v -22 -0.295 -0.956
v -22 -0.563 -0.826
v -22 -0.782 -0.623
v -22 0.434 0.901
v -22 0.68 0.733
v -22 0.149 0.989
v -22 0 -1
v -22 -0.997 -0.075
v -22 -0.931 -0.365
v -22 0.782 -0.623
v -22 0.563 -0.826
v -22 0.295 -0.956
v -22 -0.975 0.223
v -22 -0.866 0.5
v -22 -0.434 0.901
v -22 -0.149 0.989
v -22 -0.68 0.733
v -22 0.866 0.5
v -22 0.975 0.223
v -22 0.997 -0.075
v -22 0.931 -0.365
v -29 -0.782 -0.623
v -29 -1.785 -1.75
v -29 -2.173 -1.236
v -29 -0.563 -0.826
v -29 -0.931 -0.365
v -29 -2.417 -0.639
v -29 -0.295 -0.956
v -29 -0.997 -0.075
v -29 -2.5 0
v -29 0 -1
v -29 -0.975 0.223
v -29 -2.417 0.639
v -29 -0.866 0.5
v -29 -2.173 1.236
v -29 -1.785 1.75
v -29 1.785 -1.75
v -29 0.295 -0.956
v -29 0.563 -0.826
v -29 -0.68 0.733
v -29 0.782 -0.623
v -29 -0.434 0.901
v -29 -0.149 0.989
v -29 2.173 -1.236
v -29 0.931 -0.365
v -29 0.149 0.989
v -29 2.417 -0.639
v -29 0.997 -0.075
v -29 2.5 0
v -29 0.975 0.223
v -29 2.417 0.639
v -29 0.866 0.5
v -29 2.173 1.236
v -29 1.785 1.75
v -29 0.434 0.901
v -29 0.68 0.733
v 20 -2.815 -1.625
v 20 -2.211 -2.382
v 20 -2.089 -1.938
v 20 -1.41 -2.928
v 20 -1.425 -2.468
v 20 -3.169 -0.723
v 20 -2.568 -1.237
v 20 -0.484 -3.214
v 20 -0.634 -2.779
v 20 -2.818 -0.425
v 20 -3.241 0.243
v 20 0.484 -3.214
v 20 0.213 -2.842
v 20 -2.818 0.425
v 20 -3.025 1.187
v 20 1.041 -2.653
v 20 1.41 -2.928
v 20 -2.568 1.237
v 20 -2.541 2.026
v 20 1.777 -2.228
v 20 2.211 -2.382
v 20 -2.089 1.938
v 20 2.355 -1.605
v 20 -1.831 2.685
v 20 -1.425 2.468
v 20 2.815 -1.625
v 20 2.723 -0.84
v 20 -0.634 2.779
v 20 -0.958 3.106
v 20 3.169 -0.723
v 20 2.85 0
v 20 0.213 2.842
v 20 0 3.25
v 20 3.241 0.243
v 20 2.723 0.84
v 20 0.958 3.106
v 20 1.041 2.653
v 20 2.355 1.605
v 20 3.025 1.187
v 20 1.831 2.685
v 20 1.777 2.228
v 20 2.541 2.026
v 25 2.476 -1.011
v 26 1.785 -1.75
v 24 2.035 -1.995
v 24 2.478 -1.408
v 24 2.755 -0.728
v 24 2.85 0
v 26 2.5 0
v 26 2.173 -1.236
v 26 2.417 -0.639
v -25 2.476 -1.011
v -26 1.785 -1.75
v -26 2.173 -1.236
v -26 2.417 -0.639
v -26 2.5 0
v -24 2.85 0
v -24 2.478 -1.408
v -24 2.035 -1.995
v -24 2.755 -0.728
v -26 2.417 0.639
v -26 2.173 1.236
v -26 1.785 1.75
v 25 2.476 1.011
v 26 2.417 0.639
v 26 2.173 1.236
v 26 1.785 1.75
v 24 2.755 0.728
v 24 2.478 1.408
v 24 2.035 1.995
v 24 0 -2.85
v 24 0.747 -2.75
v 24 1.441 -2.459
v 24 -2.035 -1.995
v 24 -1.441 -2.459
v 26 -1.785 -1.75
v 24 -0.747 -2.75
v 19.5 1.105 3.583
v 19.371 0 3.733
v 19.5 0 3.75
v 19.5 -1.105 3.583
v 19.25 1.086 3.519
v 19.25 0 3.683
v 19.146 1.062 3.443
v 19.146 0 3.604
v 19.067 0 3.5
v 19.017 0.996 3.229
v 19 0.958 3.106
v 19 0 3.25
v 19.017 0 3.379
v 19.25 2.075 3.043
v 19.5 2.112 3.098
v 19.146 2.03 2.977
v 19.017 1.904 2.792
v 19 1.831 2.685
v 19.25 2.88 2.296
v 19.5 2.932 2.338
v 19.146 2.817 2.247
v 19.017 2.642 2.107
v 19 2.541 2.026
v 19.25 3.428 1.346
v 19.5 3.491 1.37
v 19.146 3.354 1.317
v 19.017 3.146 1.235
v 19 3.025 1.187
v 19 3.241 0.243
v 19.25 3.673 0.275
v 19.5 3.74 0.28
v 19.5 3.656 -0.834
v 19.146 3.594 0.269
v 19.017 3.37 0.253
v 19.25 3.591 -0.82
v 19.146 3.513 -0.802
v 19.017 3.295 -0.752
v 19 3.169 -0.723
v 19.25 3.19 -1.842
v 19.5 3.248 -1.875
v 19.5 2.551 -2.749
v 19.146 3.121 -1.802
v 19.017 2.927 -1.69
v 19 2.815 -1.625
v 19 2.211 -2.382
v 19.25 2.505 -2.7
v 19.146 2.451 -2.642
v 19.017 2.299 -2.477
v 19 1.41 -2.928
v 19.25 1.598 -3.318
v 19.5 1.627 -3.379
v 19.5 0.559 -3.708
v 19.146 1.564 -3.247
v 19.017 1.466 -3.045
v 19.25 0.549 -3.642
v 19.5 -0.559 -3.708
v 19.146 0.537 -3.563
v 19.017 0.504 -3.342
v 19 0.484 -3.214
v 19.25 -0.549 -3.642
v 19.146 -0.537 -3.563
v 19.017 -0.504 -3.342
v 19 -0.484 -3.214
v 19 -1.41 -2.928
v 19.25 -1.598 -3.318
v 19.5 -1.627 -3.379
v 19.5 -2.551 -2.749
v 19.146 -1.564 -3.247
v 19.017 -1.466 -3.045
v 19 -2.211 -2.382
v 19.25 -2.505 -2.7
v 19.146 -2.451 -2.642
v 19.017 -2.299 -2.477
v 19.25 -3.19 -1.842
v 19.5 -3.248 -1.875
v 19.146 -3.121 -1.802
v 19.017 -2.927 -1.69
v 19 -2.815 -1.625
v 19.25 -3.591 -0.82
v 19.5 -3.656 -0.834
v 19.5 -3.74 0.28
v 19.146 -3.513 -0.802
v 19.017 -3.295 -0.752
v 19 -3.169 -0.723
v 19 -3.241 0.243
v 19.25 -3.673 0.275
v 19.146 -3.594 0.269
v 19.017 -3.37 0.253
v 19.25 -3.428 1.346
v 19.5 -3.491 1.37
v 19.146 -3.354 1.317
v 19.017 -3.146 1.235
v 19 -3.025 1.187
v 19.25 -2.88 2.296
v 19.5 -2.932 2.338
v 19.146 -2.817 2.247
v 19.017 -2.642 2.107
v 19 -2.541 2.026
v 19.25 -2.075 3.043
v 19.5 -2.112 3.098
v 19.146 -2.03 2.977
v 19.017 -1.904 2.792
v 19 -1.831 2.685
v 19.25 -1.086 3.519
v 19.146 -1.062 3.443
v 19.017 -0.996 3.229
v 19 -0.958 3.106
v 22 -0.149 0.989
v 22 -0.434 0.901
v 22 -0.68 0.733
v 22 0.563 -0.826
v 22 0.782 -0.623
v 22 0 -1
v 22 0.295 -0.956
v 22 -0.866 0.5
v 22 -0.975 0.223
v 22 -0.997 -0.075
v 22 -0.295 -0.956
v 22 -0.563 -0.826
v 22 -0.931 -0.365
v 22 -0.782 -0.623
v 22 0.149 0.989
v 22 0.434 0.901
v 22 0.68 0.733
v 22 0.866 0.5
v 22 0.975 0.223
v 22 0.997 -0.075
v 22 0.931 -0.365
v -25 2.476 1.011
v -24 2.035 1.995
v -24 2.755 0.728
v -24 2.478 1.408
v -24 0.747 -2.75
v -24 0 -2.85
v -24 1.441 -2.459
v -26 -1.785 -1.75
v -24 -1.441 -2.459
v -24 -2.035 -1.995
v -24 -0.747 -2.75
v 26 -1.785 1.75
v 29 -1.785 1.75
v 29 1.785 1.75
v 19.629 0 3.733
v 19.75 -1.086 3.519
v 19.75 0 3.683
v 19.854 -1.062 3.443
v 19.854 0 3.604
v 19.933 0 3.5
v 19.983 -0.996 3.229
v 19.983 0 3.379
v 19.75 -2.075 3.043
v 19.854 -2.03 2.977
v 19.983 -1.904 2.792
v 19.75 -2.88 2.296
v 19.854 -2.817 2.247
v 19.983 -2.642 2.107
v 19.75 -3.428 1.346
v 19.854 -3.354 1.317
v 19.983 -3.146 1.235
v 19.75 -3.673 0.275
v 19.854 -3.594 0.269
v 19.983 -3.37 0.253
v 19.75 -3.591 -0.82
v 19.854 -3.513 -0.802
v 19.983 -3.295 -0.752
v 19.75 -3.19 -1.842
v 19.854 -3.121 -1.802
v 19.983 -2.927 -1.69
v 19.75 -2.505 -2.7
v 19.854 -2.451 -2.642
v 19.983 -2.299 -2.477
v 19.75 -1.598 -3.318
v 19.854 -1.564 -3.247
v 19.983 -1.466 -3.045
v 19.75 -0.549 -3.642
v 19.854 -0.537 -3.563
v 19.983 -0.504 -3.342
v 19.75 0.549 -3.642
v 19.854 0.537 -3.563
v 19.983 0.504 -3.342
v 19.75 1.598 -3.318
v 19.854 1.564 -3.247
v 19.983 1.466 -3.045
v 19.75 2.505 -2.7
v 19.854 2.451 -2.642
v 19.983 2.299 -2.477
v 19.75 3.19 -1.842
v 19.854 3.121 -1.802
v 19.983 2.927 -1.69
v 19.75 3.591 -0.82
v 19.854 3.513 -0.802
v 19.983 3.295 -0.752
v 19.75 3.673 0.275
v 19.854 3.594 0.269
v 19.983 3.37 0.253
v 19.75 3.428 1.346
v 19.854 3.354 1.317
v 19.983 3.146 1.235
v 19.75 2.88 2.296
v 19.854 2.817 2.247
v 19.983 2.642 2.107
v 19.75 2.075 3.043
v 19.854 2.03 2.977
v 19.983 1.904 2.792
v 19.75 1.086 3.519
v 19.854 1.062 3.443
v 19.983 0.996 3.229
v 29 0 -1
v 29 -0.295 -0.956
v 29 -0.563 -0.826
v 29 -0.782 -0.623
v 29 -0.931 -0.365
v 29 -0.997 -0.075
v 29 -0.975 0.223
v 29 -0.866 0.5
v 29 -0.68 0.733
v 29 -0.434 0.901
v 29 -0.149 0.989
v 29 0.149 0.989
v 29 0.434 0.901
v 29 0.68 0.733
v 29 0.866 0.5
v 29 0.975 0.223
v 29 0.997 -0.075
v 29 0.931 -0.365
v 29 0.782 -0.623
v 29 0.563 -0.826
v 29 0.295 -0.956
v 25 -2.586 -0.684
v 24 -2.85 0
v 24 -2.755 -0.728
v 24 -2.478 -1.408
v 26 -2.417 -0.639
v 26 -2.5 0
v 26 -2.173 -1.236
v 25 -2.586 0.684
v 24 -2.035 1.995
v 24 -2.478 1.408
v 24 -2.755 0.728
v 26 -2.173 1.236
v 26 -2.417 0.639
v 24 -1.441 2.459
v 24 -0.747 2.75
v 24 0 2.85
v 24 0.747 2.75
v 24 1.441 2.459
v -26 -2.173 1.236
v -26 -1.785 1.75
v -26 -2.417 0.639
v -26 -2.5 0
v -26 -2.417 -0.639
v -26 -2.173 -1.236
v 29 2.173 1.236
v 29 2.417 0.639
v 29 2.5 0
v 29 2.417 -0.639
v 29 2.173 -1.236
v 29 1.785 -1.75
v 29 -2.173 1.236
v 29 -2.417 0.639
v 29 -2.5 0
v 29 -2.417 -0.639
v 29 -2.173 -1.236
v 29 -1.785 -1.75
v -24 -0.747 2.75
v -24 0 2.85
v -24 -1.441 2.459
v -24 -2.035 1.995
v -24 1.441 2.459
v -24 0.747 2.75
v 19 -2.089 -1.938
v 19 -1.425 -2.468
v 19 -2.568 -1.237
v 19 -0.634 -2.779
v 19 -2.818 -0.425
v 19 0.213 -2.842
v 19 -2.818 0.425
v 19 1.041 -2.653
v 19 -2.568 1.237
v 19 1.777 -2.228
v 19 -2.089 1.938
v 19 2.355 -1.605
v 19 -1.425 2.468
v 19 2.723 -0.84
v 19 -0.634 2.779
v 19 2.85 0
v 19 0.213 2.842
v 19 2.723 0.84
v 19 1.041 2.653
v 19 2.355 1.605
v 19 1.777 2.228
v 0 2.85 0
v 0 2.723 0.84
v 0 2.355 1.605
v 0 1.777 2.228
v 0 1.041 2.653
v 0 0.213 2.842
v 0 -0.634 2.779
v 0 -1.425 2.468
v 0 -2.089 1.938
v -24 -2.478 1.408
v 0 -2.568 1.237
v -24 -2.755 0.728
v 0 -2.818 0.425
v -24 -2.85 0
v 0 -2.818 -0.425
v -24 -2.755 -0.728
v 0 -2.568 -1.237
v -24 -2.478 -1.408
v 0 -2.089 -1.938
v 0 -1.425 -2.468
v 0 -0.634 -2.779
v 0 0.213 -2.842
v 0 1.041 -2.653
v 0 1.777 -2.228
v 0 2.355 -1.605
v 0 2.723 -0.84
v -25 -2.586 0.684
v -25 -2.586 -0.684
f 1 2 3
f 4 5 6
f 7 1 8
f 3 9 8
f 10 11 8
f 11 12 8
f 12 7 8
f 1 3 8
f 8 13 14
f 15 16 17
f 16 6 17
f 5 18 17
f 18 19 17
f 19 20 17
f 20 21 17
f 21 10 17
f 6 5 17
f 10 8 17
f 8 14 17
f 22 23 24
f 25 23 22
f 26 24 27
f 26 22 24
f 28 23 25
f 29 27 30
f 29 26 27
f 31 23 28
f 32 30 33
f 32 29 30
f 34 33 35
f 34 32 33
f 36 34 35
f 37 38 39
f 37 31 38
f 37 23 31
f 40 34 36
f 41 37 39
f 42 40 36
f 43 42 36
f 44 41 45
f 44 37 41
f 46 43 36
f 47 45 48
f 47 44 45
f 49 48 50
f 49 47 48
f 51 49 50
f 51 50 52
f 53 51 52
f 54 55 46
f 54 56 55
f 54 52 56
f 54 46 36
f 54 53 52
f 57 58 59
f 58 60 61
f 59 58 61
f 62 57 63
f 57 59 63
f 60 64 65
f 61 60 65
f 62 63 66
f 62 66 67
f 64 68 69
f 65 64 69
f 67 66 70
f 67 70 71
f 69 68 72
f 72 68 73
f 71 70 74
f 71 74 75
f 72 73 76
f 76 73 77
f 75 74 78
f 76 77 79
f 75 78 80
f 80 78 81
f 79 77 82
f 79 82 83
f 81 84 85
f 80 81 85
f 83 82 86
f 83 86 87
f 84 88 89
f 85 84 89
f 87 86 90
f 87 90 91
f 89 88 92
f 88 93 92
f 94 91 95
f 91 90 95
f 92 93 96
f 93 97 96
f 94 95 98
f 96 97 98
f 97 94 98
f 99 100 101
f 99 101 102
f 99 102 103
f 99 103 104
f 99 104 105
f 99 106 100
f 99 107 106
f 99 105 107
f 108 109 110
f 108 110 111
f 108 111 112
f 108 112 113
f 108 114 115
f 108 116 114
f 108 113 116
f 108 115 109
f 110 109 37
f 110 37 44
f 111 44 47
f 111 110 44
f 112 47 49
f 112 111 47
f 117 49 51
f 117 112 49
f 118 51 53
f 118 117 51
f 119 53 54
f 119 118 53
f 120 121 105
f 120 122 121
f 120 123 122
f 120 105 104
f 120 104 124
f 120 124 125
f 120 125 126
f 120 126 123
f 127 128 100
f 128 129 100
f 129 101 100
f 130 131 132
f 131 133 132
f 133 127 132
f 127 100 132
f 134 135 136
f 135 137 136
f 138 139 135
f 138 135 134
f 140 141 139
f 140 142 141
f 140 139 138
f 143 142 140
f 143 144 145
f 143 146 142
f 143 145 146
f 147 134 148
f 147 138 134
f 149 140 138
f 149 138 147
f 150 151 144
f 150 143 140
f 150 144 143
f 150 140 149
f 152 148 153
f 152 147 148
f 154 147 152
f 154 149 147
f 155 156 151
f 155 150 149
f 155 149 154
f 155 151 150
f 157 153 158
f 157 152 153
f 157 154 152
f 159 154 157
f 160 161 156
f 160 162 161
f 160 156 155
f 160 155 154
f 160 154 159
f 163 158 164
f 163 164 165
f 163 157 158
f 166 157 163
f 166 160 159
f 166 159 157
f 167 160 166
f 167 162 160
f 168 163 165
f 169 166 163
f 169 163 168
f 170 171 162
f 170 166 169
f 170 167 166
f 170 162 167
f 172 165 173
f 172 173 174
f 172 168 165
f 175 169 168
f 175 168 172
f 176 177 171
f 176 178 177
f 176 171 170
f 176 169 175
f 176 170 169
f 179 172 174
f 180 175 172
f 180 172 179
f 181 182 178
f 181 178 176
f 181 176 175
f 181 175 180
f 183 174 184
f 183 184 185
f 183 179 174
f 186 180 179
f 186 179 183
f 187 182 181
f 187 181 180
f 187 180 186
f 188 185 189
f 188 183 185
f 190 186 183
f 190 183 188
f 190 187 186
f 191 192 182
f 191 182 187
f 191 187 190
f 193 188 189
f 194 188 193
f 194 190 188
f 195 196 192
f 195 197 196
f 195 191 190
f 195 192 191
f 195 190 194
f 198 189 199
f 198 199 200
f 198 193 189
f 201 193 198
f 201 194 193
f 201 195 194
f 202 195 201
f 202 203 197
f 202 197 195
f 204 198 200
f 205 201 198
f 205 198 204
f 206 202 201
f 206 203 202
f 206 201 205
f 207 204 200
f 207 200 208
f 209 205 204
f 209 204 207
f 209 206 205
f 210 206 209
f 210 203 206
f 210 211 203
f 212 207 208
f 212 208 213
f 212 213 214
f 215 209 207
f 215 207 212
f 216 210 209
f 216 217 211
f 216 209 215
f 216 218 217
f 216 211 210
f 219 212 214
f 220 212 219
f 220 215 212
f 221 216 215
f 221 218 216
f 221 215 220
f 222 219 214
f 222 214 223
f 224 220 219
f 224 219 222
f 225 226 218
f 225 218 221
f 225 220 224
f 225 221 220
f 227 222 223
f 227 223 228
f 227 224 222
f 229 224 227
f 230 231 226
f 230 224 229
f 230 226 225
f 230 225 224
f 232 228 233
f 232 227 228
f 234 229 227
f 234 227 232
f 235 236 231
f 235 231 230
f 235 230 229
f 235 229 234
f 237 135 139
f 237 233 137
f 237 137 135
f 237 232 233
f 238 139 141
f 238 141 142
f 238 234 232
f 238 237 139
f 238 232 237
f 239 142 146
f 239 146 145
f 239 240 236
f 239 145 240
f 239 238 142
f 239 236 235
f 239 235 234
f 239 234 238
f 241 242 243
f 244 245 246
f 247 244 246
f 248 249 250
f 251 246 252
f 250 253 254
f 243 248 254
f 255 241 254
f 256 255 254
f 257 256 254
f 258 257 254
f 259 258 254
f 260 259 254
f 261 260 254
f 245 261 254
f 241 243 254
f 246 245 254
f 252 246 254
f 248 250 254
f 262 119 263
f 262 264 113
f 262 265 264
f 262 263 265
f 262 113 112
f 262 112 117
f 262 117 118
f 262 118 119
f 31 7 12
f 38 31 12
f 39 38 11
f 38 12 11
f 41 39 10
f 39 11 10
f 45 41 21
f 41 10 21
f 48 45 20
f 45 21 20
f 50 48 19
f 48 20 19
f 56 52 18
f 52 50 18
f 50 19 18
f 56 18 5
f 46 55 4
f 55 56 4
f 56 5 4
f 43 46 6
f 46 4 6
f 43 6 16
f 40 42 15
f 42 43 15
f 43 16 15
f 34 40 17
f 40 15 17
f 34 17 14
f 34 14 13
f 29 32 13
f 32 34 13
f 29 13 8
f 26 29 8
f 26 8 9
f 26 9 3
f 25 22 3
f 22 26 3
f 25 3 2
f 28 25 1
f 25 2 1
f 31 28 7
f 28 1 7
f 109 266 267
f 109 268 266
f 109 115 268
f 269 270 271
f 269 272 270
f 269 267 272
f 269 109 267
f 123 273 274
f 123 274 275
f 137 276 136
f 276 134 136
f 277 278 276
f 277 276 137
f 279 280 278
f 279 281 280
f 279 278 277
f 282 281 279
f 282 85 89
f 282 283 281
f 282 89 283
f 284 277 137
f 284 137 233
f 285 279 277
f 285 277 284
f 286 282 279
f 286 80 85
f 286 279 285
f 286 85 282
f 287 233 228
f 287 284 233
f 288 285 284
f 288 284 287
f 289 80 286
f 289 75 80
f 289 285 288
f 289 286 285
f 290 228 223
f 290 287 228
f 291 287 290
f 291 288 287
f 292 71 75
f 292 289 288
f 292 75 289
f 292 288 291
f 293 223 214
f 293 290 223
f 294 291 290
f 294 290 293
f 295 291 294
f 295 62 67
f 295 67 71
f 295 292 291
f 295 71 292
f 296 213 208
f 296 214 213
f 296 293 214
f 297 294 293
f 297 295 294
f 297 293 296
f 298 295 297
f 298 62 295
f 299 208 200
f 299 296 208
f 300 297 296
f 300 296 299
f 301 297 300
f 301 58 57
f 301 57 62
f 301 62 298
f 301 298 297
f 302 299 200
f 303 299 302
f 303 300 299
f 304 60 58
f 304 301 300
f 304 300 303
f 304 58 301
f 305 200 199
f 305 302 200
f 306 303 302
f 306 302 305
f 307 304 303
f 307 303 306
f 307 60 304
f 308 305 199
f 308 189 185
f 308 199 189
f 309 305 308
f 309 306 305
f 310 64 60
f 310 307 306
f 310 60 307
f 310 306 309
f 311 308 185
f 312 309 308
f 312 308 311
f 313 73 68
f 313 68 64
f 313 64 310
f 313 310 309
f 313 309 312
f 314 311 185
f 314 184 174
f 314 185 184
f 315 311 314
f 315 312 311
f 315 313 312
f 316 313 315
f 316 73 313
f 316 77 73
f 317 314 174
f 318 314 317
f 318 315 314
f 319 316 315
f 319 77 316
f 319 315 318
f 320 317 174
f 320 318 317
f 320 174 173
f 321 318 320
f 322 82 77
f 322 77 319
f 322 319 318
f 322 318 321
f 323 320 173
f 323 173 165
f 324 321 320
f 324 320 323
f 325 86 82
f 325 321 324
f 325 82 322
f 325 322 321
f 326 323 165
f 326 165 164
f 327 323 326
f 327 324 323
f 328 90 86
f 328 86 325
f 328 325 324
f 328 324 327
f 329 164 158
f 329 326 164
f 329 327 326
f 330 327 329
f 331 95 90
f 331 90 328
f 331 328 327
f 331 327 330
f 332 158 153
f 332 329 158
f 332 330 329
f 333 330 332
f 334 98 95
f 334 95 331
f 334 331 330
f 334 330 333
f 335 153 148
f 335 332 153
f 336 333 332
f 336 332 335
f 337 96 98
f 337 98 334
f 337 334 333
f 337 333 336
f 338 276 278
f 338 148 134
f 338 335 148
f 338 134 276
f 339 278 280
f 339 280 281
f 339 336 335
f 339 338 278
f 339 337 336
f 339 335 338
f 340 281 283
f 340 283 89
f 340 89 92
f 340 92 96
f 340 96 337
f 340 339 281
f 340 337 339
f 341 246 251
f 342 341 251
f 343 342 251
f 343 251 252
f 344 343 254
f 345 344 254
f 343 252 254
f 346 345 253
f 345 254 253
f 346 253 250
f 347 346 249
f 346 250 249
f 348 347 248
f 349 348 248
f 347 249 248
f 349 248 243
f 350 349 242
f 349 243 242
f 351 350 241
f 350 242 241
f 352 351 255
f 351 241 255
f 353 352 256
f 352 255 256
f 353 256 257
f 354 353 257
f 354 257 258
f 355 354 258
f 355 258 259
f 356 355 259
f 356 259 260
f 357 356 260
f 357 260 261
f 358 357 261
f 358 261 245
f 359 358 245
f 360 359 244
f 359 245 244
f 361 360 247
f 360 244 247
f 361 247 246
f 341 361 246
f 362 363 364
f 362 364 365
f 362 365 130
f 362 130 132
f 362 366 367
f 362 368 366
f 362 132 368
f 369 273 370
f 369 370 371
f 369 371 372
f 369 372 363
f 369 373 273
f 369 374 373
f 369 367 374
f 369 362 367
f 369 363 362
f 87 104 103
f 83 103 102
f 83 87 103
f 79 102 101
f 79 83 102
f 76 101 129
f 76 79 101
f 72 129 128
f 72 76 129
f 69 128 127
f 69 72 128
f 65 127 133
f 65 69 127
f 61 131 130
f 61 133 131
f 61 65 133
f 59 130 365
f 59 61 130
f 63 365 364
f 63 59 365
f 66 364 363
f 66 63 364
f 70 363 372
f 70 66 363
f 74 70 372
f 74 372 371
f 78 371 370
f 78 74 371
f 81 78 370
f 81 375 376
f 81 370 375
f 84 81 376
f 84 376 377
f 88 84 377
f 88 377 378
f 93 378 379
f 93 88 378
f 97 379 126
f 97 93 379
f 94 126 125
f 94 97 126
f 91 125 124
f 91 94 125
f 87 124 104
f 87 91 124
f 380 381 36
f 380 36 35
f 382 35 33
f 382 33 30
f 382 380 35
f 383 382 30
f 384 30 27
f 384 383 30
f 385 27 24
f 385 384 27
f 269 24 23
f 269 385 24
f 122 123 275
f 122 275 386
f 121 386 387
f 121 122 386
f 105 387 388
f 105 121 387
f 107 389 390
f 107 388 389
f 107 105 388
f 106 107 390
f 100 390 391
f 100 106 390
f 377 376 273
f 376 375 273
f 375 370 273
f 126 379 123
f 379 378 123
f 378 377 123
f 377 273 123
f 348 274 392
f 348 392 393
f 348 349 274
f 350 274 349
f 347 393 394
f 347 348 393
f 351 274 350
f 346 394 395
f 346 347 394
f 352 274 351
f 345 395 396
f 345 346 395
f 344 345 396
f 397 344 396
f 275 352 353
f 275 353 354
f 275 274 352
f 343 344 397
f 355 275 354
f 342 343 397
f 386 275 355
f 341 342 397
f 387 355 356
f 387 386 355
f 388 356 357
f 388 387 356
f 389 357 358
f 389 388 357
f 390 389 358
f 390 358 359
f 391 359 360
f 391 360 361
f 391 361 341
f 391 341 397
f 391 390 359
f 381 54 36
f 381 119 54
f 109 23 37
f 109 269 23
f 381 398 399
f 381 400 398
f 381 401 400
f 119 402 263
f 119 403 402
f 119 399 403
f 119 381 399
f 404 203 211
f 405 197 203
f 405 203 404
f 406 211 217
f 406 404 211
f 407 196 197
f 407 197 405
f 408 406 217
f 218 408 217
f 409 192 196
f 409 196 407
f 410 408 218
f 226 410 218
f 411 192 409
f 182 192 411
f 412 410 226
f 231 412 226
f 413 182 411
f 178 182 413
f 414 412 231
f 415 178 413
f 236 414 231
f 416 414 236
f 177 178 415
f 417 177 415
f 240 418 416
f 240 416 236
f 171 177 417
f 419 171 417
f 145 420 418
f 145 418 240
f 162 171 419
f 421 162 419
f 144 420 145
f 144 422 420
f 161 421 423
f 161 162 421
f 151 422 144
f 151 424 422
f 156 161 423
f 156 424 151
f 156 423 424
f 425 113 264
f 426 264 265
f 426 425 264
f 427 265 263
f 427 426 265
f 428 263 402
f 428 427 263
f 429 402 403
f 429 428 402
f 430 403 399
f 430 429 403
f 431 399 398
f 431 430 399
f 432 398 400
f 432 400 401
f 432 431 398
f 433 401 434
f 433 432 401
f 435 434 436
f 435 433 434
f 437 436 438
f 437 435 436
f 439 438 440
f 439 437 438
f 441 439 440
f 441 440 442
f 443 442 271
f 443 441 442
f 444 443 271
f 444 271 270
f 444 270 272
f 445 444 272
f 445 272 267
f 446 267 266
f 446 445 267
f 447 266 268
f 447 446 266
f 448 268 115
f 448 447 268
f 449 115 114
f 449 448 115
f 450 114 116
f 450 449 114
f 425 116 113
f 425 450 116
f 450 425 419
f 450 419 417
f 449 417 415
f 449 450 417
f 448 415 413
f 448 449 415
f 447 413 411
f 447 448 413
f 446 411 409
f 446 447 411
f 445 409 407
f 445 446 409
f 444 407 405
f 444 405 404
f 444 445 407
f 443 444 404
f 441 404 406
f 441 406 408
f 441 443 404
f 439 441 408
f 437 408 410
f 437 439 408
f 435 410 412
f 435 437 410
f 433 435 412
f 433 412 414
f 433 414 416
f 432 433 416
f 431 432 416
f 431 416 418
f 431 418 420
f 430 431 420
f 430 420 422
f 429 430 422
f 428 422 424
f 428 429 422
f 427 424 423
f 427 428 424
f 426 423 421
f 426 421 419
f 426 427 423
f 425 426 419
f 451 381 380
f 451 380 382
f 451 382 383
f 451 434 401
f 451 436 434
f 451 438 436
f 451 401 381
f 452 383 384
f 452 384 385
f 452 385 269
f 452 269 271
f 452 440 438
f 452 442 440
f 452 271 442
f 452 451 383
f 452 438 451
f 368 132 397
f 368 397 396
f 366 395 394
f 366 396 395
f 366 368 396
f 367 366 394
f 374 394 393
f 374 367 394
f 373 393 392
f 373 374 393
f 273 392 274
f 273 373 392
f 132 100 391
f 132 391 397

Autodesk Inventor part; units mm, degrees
ref_plane "YZ Plane" through (0, 0, 0) normal (1, 0, 0) x (0, 1, 0)
sketch "Sketch1" plane through (0, 0, 0) normal (1, 0, 0) x (0, 1, 0)
  circle A0 centre (0, 0) radius 2.85
  dimension "diameter" = 5.7
extrude "Shaft" add sketch "Sketch1" along normal mid plane 48
ref_plane "Work Plane1" through (26, 0, 0) normal (1, 0, 0) x (0, 0, -1)
sketch "Sketch3" plane through (26, 0, 0) normal (1, 0, 0) x (0, 0, -1)
  circle A0 centre (0, 0) radius 2.85 construction
  circle A1 centre (0, 0) radius 2.5
  line L0 (-1.75, 1.7854) -> (1.75, 1.7854)
  line L1 (1.75, 1.7854) -> (1.75, -1.7854)
  line L2 (1.75, -1.7854) -> (-1.75, -1.7854)
  line L3 (-1.75, -1.7854) -> (-1.75, 1.7854)
  line L4 (-1.75, 1.7854) -> (1.75, -1.7854) construction
  line L5 (1.75, 1.7854) -> (-1.75, -1.7854) construction
  dimension "d77" = 5
  dimension "d76" = 3.5
extrude "Wheel Insert Profile" add sketch "Sketch3" along normal blind 3 contours L0 A1 | L1 L2 L3 L0 | A1 L2
loft "Loft1" add section 1 edges at (24, -2.85, 0) section 2 edges at (26, 0, 1.75) (26, 2.5, 0) (26, 0, -1.75) (26, -2.5, 0)
ref_plane "Work Plane2" through (19, 0, 0) normal (-1, 0, 0) x (0, 0, 1)
sketch "Sketch4" plane through (19, 0, 0) normal (-1, 0, 0) x (0, 0, 1)
  circle A0 centre (0, 0) radius 3.75
  dimension "d35" = 7.5
extrude "Stopper" add sketch "Sketch4" against normal blind 1
fillet "Fillet1" radius 0.5 2 edges at (19, 0, -3.75) (20, 0, -3.75)
sketch "Sketch9" plane through (29, 0, 0) normal (1, 0, 0) x (0, 0, -1)
  arc A0 (1.75, 1.7854) -> (-1.75, 1.7854) centre (0, 0) ccw projected
hole "Hole1" at (29, 0, 0) direction (-1, 0, 0) diameter 2 depth 7
mirror "Mirror1" about plane through (0, 0, 0) normal (1, 0, 0) of "Loft1", "Wheel Insert Profile", "Hole1"
properties part number "front shaft v3"
